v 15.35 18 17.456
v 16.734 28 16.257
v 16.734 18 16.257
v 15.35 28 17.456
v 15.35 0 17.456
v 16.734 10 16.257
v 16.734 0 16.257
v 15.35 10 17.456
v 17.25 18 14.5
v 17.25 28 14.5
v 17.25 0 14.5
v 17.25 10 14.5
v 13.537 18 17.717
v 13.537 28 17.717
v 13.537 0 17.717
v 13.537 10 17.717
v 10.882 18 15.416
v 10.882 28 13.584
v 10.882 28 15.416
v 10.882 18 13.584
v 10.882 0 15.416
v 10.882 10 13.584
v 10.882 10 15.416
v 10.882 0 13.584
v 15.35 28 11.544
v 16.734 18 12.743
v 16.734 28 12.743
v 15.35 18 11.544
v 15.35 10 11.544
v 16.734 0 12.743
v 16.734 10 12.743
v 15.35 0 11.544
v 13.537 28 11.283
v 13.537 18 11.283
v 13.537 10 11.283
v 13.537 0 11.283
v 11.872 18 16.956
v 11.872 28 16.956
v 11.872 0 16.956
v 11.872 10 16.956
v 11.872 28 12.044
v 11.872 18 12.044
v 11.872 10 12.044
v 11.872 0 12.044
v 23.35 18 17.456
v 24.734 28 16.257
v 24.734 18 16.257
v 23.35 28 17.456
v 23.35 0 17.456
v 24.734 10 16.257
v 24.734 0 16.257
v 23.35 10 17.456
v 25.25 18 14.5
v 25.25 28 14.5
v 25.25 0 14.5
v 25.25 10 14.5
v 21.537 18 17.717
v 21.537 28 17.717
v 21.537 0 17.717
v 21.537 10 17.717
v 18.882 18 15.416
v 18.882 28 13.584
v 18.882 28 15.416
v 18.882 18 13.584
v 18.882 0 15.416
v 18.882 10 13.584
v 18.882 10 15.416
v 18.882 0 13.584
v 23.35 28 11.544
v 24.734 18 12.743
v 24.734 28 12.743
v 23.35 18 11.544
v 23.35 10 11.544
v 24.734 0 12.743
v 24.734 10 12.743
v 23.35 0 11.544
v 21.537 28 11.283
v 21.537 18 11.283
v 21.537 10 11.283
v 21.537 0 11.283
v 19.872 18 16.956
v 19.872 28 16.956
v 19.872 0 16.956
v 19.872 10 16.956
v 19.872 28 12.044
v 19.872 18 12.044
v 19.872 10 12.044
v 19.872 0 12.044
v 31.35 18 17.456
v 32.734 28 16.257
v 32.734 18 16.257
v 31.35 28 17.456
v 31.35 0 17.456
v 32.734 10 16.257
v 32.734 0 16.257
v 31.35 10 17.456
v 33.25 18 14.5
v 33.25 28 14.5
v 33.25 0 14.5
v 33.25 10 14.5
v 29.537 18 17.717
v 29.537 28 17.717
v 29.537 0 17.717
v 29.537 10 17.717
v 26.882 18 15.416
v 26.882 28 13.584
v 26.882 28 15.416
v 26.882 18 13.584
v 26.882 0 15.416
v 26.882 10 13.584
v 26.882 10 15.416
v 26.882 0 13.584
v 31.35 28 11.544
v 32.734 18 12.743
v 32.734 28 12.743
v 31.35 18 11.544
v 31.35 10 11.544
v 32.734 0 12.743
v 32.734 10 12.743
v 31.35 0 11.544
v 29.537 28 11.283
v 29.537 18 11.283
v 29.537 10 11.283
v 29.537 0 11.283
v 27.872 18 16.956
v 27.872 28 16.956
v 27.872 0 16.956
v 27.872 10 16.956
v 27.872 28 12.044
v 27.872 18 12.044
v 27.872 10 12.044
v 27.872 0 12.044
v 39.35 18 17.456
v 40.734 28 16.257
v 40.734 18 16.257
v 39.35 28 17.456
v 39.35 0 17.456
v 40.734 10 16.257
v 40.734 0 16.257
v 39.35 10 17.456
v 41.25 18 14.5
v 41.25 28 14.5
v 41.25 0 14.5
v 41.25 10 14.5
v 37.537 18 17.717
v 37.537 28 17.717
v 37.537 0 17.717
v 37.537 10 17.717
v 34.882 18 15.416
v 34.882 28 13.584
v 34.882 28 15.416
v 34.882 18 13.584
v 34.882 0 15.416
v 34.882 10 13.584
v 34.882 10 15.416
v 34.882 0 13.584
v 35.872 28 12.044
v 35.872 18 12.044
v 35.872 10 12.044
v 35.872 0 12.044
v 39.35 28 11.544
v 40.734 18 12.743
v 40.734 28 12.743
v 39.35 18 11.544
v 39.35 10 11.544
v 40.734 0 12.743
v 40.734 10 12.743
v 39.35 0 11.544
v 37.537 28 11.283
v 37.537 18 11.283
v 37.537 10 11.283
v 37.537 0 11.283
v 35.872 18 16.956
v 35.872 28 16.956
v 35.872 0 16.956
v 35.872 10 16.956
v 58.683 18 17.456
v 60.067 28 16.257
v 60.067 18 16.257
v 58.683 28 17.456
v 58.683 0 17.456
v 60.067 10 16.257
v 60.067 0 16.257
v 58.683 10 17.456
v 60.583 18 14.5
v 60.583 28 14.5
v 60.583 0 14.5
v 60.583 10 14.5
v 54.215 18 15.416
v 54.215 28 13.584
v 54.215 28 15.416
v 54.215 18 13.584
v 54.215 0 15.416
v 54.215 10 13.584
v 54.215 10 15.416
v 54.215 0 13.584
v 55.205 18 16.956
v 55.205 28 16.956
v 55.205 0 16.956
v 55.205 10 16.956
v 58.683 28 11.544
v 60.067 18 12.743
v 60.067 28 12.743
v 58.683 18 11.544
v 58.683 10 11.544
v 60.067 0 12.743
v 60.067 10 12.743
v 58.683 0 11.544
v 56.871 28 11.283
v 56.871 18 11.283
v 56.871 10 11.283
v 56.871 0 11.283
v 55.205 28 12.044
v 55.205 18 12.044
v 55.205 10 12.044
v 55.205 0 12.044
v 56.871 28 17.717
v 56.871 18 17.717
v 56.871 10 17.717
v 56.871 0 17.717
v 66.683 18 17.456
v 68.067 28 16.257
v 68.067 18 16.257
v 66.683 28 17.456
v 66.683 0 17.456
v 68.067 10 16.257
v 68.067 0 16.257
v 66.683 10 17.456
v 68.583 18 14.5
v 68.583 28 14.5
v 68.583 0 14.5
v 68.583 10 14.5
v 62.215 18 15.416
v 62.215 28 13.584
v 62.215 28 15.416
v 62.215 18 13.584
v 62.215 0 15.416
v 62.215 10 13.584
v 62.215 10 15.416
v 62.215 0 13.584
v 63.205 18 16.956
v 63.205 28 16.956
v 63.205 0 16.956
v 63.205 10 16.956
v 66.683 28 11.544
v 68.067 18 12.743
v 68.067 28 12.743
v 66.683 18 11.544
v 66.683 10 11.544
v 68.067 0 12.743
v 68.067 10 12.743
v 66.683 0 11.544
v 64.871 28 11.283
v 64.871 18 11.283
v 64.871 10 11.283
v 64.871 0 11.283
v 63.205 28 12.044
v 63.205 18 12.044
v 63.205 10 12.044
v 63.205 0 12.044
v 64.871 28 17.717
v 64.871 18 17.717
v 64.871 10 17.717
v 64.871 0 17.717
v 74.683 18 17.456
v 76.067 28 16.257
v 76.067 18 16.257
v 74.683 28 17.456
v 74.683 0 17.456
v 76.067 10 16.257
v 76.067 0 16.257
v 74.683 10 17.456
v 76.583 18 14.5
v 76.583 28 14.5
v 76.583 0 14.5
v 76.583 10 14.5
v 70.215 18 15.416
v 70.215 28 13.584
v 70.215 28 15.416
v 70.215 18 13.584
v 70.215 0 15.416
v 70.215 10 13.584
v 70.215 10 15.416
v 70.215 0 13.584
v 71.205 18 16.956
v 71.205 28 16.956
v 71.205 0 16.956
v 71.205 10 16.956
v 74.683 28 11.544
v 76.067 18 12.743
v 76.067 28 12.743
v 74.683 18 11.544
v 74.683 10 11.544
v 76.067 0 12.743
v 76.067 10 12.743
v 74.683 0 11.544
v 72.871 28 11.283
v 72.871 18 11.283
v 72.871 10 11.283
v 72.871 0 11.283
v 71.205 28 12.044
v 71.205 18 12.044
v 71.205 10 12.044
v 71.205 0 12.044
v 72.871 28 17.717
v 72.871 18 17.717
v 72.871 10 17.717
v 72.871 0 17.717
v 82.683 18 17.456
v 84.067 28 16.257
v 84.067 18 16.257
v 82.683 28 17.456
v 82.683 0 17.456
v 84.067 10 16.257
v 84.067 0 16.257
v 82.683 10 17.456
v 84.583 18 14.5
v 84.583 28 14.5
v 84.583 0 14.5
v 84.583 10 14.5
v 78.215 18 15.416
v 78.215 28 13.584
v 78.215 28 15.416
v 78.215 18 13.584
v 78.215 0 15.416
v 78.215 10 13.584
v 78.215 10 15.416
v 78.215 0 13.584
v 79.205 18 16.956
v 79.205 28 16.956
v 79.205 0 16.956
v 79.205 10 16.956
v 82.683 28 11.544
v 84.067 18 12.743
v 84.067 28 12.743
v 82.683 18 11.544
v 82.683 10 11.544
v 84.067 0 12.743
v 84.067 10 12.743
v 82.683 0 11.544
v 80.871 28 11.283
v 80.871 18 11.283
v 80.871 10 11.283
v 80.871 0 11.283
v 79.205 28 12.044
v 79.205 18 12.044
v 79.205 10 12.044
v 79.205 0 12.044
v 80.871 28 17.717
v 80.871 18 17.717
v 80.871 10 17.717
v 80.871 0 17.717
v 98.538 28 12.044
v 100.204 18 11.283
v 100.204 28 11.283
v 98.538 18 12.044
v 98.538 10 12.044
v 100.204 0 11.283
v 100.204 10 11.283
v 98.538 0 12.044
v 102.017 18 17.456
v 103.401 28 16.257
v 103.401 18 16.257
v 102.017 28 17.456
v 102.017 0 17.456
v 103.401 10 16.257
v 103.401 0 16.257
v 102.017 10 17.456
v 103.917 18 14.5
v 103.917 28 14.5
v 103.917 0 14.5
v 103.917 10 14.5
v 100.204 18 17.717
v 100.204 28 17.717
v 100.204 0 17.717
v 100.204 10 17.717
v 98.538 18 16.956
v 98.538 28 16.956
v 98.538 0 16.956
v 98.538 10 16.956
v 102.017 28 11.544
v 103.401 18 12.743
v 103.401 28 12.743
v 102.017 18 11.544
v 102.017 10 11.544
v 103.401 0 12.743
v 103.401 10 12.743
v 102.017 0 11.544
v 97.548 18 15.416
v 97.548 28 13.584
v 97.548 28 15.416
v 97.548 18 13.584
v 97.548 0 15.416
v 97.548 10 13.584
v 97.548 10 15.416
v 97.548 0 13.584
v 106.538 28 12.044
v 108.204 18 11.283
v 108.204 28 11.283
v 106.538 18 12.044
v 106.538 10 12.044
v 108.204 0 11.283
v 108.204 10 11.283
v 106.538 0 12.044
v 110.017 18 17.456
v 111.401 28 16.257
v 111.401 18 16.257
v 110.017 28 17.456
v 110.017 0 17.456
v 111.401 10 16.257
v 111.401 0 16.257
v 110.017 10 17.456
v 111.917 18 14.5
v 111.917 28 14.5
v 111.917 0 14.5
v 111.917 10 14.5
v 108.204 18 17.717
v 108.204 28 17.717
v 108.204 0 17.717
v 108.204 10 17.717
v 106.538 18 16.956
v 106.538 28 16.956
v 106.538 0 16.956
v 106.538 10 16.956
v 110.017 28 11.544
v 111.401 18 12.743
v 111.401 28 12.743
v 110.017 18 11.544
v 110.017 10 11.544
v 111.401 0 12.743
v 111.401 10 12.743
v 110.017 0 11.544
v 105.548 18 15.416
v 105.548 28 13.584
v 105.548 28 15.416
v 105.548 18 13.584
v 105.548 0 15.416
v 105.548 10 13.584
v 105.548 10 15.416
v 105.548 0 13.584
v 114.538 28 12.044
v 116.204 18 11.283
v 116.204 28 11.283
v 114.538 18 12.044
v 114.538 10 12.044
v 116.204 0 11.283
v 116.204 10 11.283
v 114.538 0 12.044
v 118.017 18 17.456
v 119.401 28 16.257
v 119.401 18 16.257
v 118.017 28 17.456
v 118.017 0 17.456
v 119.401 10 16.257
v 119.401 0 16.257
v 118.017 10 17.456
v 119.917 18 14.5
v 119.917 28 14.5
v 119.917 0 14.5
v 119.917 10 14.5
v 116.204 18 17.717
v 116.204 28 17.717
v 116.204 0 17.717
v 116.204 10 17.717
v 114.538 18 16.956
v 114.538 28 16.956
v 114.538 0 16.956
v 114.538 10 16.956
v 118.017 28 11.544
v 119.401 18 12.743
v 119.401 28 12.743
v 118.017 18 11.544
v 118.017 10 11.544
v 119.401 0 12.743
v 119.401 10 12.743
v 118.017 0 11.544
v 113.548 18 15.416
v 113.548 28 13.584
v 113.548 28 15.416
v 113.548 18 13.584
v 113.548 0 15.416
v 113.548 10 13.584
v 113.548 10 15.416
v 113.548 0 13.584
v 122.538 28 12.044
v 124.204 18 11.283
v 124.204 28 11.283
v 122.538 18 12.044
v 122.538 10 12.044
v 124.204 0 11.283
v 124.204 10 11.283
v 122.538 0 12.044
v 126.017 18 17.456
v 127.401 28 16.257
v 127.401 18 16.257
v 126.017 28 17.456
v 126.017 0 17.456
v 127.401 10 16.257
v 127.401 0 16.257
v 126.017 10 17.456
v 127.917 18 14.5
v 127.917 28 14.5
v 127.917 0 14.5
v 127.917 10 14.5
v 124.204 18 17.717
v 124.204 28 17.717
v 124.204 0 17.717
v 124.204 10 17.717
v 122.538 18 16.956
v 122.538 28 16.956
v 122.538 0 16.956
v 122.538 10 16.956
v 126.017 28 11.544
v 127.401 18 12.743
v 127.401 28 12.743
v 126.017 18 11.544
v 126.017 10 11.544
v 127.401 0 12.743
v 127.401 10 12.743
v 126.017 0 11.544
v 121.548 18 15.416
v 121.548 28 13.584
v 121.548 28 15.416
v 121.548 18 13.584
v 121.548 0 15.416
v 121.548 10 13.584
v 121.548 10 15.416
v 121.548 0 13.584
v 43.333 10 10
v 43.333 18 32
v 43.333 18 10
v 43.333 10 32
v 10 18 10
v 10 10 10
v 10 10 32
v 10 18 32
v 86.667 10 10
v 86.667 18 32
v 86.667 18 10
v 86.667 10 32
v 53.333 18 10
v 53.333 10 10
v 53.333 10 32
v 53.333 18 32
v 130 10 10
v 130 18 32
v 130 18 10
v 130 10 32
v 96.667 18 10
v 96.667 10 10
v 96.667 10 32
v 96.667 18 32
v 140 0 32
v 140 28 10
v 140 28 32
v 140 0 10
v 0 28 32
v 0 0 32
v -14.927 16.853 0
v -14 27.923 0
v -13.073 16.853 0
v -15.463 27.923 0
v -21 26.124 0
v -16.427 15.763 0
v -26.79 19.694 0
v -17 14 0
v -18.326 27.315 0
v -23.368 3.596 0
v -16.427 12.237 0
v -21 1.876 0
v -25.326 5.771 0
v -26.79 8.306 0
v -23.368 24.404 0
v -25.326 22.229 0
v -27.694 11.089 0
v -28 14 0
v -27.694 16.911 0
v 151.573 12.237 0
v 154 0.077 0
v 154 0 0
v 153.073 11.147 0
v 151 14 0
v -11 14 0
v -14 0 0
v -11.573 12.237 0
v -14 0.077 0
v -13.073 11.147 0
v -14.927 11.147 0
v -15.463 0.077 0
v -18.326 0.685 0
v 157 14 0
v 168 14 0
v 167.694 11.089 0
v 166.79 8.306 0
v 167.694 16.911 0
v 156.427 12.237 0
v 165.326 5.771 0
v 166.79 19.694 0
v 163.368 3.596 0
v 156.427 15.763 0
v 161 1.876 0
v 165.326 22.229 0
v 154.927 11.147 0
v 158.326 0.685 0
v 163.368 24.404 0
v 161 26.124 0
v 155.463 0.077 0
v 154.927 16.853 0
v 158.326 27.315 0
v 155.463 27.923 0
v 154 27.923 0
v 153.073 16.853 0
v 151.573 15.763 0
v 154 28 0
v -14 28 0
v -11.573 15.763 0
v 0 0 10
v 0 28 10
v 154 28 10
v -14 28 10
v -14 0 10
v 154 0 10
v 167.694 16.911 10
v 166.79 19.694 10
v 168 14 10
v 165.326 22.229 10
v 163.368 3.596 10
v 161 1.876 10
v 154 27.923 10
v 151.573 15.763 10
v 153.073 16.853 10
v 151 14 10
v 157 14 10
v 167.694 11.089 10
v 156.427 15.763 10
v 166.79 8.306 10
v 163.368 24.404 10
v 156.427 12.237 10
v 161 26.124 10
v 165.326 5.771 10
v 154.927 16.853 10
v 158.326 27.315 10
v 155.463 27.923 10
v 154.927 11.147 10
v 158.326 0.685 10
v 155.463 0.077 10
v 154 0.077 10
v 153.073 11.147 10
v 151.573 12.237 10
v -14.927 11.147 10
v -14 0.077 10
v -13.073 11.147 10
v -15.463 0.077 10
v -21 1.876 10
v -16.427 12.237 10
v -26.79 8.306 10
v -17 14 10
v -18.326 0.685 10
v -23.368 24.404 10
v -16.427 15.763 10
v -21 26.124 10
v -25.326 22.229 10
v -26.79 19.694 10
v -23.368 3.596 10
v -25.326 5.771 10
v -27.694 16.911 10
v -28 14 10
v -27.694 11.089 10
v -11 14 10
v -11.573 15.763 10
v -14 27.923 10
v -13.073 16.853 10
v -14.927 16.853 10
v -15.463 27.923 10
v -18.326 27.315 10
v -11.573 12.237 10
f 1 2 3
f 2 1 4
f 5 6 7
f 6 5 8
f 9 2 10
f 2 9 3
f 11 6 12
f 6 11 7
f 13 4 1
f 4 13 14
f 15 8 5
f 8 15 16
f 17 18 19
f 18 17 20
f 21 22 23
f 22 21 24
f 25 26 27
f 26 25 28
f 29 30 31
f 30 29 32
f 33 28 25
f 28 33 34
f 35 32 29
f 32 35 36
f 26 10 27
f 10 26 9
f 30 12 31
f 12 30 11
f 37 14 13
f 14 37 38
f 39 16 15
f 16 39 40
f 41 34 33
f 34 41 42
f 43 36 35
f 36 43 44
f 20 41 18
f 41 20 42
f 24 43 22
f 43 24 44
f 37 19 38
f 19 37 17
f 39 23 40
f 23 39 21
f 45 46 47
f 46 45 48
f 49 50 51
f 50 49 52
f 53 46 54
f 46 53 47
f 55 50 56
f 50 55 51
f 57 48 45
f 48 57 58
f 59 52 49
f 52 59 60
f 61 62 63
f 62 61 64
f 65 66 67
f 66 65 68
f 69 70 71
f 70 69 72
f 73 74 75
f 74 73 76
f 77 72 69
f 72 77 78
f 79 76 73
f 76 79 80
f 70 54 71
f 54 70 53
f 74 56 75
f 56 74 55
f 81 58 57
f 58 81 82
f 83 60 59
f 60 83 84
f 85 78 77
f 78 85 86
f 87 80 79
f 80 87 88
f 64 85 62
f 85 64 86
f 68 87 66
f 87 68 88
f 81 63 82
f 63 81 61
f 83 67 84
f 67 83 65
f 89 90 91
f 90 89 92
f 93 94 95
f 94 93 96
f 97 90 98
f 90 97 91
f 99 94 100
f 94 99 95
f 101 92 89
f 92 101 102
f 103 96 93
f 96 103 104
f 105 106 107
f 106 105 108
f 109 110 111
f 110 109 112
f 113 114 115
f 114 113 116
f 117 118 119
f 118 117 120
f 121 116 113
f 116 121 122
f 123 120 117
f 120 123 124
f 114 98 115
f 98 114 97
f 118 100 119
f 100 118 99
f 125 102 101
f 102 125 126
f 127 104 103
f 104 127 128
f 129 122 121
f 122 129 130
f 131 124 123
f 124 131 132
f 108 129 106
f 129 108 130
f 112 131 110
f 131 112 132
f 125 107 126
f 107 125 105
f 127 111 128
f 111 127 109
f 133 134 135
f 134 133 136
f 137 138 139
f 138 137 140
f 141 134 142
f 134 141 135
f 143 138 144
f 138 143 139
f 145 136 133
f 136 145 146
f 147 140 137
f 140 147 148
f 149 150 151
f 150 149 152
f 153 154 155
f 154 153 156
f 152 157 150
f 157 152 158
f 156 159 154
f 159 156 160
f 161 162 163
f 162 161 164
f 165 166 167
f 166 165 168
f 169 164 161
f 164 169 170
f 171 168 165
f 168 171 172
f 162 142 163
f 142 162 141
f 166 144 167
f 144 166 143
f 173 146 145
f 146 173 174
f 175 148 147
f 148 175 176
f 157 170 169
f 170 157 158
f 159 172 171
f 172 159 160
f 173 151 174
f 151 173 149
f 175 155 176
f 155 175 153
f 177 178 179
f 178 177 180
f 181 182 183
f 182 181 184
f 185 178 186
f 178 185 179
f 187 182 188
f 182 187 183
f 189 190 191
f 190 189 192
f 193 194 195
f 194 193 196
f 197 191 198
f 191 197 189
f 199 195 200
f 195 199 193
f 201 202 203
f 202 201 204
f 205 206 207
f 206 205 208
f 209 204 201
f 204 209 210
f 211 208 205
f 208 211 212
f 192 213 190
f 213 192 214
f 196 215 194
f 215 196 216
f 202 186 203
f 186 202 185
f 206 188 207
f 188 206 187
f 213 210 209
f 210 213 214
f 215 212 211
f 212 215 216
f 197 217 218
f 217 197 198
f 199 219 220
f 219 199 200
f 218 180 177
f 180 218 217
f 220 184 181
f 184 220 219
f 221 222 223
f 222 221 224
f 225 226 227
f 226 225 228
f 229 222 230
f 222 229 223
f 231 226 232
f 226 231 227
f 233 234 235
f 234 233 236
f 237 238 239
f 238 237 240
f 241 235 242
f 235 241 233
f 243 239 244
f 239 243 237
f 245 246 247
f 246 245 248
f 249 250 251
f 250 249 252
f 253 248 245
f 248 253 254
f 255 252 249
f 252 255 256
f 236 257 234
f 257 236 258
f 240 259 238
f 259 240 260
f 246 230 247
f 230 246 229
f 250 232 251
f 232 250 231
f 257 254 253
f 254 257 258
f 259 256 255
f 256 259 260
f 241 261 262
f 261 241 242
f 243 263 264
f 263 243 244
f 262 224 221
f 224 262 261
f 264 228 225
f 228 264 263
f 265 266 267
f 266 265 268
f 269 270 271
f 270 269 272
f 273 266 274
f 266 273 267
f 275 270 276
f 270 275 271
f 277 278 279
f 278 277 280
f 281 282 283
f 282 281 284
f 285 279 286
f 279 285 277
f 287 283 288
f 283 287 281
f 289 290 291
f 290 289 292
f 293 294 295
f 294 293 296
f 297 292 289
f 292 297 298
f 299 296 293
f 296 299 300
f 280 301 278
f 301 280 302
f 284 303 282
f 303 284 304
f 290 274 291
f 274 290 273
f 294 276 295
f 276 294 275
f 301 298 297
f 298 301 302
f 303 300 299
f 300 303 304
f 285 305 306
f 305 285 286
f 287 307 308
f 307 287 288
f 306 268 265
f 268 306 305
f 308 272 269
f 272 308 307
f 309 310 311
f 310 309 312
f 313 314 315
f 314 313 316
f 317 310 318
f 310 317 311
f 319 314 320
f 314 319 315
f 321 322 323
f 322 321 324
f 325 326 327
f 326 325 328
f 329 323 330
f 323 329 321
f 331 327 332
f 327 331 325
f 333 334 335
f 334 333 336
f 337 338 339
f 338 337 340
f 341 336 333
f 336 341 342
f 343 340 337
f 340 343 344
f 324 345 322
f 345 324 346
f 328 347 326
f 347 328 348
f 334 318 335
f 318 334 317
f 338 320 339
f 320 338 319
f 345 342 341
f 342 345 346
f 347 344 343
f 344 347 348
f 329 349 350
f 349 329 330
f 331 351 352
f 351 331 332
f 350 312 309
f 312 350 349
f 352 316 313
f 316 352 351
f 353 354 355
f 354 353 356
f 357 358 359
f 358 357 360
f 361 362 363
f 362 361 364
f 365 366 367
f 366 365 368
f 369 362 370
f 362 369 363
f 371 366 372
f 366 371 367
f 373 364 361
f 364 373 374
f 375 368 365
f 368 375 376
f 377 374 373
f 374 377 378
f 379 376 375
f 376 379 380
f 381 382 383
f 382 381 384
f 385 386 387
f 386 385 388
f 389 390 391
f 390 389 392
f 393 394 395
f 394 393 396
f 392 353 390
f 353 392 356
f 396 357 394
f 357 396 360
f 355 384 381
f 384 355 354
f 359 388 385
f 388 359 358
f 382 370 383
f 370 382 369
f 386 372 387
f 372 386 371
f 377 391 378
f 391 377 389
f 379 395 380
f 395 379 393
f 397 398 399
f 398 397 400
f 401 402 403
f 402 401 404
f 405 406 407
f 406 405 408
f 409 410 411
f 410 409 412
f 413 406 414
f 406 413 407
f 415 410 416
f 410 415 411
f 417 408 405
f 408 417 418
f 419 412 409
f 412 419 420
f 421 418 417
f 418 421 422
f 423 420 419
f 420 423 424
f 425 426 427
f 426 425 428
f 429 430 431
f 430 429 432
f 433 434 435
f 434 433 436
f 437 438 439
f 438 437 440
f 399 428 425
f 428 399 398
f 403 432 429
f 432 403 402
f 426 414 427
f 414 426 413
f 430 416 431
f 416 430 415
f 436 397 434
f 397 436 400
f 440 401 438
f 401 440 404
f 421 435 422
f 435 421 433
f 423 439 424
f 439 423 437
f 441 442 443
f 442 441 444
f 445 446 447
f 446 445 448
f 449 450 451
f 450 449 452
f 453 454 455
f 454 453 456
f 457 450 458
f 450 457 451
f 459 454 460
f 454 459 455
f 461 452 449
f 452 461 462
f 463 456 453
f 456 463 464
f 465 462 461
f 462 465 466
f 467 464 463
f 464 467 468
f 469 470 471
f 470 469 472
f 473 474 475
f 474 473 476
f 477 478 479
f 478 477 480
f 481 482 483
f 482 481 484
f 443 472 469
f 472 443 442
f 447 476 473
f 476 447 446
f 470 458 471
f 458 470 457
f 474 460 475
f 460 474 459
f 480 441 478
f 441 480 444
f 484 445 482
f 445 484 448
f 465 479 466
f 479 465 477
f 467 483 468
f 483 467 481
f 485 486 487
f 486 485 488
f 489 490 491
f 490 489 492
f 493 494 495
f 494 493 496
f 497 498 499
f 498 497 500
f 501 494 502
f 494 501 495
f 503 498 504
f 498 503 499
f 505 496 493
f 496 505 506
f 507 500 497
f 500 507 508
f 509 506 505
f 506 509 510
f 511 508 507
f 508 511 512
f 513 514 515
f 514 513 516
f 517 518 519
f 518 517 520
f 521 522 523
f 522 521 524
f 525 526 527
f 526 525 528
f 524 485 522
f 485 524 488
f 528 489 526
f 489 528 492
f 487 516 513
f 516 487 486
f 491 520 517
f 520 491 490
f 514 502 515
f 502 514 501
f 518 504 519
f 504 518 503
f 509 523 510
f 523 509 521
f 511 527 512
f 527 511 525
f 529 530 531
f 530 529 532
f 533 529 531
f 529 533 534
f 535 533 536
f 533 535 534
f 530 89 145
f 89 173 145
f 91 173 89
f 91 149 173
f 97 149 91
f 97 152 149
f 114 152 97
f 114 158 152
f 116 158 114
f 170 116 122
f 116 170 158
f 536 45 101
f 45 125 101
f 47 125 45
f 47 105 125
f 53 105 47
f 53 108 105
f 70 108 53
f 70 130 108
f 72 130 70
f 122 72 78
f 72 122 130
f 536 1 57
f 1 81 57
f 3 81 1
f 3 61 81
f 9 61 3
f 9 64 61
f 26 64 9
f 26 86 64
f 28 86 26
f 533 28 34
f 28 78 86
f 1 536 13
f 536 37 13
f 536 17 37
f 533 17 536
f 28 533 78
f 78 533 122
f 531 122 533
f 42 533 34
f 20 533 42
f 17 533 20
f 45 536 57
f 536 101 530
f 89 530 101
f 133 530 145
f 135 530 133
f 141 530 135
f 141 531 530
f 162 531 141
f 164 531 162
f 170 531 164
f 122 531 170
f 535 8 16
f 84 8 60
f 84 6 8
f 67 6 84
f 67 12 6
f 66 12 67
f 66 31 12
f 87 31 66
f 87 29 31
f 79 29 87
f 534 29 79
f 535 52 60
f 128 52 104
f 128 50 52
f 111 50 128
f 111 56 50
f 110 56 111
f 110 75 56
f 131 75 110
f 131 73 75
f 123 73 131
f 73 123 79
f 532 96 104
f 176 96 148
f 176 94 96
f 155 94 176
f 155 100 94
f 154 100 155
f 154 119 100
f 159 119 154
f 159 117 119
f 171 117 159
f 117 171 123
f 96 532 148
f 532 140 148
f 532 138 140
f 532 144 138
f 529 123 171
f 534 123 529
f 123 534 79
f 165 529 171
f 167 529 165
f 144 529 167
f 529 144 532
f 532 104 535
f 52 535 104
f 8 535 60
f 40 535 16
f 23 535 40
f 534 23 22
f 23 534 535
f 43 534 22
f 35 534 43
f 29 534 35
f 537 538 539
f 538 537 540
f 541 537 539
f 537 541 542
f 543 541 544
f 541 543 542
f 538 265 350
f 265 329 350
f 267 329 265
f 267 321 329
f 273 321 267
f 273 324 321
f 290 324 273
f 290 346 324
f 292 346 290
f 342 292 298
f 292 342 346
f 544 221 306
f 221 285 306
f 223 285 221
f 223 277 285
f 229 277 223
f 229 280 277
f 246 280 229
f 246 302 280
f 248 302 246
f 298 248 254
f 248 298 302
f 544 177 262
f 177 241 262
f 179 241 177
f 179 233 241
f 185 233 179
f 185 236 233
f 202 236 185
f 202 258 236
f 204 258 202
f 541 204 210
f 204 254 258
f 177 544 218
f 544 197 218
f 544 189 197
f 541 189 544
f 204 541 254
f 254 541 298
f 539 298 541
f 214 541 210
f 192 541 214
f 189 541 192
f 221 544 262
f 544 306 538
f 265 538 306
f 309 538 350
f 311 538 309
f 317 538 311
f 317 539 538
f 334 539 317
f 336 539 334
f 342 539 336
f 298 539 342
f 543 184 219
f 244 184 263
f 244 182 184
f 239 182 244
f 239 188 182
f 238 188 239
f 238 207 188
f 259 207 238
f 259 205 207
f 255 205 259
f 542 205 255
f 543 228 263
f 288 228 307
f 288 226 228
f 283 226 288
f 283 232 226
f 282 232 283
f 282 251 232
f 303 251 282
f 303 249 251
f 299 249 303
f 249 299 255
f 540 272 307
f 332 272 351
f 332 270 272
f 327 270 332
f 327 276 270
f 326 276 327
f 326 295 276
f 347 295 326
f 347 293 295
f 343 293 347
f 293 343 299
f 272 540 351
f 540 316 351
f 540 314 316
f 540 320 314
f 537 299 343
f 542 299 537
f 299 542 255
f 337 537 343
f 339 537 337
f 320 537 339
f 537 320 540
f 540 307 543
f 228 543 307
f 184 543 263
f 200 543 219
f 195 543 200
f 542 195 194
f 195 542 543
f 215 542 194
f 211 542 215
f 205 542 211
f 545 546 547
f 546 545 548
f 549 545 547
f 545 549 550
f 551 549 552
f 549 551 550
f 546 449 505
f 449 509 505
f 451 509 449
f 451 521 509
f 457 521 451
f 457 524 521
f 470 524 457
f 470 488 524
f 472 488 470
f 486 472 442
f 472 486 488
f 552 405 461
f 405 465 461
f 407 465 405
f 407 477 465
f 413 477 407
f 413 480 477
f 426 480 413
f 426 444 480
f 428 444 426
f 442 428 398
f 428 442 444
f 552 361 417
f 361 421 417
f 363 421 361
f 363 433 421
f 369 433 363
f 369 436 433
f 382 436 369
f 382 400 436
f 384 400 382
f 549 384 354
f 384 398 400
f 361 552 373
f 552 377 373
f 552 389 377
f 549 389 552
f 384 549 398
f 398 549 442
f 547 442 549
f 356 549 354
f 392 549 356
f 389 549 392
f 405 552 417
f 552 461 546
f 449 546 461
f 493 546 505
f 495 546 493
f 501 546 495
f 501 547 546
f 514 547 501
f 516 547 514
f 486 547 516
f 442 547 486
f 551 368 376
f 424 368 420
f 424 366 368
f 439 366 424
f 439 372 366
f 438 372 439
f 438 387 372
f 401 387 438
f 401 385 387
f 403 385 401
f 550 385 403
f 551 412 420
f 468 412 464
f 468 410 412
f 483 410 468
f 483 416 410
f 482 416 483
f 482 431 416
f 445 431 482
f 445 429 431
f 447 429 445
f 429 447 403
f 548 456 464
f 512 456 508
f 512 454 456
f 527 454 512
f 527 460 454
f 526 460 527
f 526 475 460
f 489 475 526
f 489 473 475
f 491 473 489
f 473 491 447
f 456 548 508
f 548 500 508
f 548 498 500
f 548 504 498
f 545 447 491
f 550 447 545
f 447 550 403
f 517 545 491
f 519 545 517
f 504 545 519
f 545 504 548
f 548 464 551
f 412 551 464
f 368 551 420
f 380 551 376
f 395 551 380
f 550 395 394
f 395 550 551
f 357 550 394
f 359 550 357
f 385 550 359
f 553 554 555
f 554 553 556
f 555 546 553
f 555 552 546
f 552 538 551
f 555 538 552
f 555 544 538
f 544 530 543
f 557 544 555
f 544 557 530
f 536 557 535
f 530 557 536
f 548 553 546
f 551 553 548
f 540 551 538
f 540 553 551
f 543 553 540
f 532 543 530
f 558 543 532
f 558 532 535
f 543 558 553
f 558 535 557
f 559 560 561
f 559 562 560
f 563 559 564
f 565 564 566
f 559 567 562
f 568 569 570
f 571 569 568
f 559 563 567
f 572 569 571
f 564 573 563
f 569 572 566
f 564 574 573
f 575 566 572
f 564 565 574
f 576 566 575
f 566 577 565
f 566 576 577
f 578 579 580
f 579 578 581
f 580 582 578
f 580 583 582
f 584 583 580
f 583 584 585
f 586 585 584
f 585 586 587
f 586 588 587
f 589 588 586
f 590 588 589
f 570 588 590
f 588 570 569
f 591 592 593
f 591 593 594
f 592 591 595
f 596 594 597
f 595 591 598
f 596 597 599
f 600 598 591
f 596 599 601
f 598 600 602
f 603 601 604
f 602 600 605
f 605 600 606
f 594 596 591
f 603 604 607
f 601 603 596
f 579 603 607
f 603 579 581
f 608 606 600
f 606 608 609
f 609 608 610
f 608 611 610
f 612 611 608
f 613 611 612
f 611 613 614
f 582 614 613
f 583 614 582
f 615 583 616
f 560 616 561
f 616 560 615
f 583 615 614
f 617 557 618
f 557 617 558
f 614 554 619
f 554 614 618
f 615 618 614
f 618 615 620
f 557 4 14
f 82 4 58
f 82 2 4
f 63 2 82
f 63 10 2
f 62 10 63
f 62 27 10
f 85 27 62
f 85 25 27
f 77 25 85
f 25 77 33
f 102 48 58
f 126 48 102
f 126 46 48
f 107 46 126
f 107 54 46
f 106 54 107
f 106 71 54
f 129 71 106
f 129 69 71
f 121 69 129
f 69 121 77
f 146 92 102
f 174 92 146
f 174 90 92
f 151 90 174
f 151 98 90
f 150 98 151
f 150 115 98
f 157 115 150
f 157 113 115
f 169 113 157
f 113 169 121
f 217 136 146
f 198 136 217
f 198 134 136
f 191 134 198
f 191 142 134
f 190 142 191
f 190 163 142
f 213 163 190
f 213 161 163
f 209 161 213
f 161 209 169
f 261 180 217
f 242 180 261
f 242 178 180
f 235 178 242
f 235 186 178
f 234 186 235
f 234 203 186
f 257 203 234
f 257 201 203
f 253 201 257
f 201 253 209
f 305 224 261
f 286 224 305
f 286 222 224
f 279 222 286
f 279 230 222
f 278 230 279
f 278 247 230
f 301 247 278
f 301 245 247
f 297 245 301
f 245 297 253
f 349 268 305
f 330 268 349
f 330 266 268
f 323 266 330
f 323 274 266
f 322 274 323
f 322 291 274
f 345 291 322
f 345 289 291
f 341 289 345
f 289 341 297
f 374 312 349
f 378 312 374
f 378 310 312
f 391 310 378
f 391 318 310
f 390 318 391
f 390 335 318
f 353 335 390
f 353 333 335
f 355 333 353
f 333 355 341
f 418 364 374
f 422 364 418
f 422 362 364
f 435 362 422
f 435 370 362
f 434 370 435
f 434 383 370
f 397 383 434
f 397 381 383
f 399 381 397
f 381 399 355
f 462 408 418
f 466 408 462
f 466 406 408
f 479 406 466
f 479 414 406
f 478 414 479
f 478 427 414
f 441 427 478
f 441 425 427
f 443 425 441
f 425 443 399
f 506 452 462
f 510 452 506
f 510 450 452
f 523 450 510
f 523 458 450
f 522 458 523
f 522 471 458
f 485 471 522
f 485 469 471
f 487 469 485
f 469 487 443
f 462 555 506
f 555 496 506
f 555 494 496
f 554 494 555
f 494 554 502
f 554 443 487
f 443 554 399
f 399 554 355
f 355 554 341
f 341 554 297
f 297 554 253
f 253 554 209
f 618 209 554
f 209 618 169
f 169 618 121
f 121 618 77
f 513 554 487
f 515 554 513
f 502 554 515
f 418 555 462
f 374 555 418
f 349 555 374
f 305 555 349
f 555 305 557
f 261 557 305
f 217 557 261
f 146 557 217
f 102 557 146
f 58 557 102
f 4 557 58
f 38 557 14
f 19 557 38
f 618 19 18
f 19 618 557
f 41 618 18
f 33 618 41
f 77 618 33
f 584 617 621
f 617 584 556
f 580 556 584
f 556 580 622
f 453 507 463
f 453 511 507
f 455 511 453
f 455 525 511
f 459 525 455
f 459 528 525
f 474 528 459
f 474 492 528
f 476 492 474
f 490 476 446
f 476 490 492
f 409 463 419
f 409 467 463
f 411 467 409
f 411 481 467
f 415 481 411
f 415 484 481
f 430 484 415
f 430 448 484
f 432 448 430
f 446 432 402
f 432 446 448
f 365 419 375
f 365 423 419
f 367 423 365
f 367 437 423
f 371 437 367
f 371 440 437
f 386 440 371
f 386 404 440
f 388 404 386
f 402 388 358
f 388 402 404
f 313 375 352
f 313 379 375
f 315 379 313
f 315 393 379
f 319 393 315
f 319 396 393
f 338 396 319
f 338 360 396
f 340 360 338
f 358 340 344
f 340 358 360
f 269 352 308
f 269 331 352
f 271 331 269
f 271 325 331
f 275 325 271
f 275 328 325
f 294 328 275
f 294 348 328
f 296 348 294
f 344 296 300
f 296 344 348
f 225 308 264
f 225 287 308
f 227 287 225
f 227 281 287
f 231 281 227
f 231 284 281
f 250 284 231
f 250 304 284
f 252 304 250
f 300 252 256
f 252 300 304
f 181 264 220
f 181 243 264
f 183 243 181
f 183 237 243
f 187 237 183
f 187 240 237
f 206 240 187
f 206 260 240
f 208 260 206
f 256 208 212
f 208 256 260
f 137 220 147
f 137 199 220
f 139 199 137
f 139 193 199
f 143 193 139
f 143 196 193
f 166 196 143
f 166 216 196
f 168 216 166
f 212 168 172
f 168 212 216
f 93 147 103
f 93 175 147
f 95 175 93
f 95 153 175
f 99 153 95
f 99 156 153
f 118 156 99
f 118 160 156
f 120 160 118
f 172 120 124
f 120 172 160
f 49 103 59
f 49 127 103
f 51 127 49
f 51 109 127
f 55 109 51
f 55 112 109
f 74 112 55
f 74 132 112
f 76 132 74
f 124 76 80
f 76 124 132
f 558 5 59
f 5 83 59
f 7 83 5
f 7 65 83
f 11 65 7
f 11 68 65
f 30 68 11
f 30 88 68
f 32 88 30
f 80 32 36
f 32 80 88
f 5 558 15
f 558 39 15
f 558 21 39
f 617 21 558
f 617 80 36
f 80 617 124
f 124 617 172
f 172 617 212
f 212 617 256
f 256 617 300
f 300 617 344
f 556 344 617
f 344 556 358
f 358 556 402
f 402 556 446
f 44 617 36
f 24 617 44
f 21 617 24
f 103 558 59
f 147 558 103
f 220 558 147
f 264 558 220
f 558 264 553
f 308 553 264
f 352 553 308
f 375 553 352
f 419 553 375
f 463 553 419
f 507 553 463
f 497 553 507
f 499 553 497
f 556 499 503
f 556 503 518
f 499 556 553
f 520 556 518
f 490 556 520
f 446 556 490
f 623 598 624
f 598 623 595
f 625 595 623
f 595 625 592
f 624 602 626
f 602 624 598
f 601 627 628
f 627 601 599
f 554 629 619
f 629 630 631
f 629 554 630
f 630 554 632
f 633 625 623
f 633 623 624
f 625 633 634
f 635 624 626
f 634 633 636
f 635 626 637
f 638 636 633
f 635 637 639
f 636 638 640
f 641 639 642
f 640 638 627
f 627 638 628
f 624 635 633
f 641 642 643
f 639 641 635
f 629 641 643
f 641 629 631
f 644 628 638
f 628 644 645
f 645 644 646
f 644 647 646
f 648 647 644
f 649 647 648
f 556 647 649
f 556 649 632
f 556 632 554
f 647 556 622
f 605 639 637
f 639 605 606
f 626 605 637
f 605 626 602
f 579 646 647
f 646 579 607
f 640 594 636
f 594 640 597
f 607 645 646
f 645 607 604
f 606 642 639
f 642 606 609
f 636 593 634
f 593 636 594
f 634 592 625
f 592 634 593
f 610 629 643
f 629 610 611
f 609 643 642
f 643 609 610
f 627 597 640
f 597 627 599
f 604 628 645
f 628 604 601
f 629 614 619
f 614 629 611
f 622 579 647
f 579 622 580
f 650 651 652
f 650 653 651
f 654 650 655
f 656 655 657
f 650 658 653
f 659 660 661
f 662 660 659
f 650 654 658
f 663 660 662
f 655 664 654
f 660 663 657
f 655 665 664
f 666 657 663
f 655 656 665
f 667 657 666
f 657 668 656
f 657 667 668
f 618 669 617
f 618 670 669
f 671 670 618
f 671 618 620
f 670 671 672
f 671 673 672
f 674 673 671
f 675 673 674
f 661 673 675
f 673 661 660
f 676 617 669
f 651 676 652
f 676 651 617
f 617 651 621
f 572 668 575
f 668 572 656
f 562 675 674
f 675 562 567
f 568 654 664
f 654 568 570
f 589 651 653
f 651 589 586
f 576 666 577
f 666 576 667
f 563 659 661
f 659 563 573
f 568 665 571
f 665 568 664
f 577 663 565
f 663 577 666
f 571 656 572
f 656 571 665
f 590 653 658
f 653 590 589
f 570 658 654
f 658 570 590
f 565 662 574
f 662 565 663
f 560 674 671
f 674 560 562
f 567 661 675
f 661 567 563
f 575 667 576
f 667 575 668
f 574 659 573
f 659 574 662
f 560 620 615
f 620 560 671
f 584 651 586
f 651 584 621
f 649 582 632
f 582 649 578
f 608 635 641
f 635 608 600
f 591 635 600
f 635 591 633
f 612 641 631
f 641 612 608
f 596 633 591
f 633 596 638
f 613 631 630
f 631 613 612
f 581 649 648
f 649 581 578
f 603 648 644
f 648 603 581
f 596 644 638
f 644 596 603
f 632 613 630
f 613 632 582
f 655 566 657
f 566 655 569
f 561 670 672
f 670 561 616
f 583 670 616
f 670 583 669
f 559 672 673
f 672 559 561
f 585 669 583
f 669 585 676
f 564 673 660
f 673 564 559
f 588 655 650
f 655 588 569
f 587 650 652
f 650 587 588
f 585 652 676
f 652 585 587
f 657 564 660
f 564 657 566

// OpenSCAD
//// measures in mm
//surrounding insulation thickness
wall = 10;

//basic dimensions of the bus
sections = 3;
len_per_hole = 8.333333333;
num_wire_holes = 4;
section_l = len_per_hole * num_wire_holes;
busses_l = (section_l+wall)*sections + wall;
bus_h = 12;
bus_w = 8;



//horizontal wire holes

wire_hole_v_offset = 1.25; // distance from bottom of bus to bottom of wire hole
wire_hole_spacing = 8;
wire_hole_diameter = 6.5;

//screw down flanges
flange_height = 10;
flange_radius = bus_w/2  + wall ;
mount_hole_diameter = 6; // #10 through-hole =  6

//---------------------------------

// body
difference(){
 // insulation	
 cube([busses_l, bus_w + (wall*2),bus_h + (wall*2)], center=false);
 // cutouts
 union(){
//	// the bus itself
    for( i= [0:(sections-1)]){
        translate([i*section_l+(i+1)*wall,wall,wall]) 
            cube([section_l,bus_w,bus_h+wall+1000], center = false);
//    
//    
//	// wire holes 
        for( j= [0:(num_wire_holes-1)]){
            translate([wire_hole_spacing/2+wire_hole_spacing*j+(section_l*i)+(i+1)*wall,1+bus_w+wall*2,wall+wire_hole_diameter/2+wire_hole_v_offset]) rotate([90,0,0]) 
                cylinder(h=bus_w+(wall*2)+2, r = wire_hole_diameter/2, center=false);
        }
    }
 }
}

// mounting flanges
difference(){
	// flanges
	union(){
		translate([busses_l + flange_radius,wall+bus_w/2,0]) 
			cylinder(h=flange_height, r = flange_radius, center=false);
		translate([busses_l,0,0]) 
			cube([flange_radius,flange_radius*2,flange_height], center=false);
		translate([-flange_radius,wall+bus_w/2,0]) 
			cylinder(h=flange_height, r = flange_radius, center=false);
		translate([-flange_radius,0,0]) 
			cube([flange_radius,flange_radius*2,flange_height], center=false);
	}
	// mount holes
	union(){
		translate([busses_l+flange_radius,wall+bus_w/2,-1])  
			cylinder(h=flange_height+2, r = mount_hole_diameter/2, center=false);
		translate([-flange_radius,wall+bus_w/2,-1])  
			cylinder(h=flange_height+2, r = mount_hole_diameter/2, center=false);
	}	
}
